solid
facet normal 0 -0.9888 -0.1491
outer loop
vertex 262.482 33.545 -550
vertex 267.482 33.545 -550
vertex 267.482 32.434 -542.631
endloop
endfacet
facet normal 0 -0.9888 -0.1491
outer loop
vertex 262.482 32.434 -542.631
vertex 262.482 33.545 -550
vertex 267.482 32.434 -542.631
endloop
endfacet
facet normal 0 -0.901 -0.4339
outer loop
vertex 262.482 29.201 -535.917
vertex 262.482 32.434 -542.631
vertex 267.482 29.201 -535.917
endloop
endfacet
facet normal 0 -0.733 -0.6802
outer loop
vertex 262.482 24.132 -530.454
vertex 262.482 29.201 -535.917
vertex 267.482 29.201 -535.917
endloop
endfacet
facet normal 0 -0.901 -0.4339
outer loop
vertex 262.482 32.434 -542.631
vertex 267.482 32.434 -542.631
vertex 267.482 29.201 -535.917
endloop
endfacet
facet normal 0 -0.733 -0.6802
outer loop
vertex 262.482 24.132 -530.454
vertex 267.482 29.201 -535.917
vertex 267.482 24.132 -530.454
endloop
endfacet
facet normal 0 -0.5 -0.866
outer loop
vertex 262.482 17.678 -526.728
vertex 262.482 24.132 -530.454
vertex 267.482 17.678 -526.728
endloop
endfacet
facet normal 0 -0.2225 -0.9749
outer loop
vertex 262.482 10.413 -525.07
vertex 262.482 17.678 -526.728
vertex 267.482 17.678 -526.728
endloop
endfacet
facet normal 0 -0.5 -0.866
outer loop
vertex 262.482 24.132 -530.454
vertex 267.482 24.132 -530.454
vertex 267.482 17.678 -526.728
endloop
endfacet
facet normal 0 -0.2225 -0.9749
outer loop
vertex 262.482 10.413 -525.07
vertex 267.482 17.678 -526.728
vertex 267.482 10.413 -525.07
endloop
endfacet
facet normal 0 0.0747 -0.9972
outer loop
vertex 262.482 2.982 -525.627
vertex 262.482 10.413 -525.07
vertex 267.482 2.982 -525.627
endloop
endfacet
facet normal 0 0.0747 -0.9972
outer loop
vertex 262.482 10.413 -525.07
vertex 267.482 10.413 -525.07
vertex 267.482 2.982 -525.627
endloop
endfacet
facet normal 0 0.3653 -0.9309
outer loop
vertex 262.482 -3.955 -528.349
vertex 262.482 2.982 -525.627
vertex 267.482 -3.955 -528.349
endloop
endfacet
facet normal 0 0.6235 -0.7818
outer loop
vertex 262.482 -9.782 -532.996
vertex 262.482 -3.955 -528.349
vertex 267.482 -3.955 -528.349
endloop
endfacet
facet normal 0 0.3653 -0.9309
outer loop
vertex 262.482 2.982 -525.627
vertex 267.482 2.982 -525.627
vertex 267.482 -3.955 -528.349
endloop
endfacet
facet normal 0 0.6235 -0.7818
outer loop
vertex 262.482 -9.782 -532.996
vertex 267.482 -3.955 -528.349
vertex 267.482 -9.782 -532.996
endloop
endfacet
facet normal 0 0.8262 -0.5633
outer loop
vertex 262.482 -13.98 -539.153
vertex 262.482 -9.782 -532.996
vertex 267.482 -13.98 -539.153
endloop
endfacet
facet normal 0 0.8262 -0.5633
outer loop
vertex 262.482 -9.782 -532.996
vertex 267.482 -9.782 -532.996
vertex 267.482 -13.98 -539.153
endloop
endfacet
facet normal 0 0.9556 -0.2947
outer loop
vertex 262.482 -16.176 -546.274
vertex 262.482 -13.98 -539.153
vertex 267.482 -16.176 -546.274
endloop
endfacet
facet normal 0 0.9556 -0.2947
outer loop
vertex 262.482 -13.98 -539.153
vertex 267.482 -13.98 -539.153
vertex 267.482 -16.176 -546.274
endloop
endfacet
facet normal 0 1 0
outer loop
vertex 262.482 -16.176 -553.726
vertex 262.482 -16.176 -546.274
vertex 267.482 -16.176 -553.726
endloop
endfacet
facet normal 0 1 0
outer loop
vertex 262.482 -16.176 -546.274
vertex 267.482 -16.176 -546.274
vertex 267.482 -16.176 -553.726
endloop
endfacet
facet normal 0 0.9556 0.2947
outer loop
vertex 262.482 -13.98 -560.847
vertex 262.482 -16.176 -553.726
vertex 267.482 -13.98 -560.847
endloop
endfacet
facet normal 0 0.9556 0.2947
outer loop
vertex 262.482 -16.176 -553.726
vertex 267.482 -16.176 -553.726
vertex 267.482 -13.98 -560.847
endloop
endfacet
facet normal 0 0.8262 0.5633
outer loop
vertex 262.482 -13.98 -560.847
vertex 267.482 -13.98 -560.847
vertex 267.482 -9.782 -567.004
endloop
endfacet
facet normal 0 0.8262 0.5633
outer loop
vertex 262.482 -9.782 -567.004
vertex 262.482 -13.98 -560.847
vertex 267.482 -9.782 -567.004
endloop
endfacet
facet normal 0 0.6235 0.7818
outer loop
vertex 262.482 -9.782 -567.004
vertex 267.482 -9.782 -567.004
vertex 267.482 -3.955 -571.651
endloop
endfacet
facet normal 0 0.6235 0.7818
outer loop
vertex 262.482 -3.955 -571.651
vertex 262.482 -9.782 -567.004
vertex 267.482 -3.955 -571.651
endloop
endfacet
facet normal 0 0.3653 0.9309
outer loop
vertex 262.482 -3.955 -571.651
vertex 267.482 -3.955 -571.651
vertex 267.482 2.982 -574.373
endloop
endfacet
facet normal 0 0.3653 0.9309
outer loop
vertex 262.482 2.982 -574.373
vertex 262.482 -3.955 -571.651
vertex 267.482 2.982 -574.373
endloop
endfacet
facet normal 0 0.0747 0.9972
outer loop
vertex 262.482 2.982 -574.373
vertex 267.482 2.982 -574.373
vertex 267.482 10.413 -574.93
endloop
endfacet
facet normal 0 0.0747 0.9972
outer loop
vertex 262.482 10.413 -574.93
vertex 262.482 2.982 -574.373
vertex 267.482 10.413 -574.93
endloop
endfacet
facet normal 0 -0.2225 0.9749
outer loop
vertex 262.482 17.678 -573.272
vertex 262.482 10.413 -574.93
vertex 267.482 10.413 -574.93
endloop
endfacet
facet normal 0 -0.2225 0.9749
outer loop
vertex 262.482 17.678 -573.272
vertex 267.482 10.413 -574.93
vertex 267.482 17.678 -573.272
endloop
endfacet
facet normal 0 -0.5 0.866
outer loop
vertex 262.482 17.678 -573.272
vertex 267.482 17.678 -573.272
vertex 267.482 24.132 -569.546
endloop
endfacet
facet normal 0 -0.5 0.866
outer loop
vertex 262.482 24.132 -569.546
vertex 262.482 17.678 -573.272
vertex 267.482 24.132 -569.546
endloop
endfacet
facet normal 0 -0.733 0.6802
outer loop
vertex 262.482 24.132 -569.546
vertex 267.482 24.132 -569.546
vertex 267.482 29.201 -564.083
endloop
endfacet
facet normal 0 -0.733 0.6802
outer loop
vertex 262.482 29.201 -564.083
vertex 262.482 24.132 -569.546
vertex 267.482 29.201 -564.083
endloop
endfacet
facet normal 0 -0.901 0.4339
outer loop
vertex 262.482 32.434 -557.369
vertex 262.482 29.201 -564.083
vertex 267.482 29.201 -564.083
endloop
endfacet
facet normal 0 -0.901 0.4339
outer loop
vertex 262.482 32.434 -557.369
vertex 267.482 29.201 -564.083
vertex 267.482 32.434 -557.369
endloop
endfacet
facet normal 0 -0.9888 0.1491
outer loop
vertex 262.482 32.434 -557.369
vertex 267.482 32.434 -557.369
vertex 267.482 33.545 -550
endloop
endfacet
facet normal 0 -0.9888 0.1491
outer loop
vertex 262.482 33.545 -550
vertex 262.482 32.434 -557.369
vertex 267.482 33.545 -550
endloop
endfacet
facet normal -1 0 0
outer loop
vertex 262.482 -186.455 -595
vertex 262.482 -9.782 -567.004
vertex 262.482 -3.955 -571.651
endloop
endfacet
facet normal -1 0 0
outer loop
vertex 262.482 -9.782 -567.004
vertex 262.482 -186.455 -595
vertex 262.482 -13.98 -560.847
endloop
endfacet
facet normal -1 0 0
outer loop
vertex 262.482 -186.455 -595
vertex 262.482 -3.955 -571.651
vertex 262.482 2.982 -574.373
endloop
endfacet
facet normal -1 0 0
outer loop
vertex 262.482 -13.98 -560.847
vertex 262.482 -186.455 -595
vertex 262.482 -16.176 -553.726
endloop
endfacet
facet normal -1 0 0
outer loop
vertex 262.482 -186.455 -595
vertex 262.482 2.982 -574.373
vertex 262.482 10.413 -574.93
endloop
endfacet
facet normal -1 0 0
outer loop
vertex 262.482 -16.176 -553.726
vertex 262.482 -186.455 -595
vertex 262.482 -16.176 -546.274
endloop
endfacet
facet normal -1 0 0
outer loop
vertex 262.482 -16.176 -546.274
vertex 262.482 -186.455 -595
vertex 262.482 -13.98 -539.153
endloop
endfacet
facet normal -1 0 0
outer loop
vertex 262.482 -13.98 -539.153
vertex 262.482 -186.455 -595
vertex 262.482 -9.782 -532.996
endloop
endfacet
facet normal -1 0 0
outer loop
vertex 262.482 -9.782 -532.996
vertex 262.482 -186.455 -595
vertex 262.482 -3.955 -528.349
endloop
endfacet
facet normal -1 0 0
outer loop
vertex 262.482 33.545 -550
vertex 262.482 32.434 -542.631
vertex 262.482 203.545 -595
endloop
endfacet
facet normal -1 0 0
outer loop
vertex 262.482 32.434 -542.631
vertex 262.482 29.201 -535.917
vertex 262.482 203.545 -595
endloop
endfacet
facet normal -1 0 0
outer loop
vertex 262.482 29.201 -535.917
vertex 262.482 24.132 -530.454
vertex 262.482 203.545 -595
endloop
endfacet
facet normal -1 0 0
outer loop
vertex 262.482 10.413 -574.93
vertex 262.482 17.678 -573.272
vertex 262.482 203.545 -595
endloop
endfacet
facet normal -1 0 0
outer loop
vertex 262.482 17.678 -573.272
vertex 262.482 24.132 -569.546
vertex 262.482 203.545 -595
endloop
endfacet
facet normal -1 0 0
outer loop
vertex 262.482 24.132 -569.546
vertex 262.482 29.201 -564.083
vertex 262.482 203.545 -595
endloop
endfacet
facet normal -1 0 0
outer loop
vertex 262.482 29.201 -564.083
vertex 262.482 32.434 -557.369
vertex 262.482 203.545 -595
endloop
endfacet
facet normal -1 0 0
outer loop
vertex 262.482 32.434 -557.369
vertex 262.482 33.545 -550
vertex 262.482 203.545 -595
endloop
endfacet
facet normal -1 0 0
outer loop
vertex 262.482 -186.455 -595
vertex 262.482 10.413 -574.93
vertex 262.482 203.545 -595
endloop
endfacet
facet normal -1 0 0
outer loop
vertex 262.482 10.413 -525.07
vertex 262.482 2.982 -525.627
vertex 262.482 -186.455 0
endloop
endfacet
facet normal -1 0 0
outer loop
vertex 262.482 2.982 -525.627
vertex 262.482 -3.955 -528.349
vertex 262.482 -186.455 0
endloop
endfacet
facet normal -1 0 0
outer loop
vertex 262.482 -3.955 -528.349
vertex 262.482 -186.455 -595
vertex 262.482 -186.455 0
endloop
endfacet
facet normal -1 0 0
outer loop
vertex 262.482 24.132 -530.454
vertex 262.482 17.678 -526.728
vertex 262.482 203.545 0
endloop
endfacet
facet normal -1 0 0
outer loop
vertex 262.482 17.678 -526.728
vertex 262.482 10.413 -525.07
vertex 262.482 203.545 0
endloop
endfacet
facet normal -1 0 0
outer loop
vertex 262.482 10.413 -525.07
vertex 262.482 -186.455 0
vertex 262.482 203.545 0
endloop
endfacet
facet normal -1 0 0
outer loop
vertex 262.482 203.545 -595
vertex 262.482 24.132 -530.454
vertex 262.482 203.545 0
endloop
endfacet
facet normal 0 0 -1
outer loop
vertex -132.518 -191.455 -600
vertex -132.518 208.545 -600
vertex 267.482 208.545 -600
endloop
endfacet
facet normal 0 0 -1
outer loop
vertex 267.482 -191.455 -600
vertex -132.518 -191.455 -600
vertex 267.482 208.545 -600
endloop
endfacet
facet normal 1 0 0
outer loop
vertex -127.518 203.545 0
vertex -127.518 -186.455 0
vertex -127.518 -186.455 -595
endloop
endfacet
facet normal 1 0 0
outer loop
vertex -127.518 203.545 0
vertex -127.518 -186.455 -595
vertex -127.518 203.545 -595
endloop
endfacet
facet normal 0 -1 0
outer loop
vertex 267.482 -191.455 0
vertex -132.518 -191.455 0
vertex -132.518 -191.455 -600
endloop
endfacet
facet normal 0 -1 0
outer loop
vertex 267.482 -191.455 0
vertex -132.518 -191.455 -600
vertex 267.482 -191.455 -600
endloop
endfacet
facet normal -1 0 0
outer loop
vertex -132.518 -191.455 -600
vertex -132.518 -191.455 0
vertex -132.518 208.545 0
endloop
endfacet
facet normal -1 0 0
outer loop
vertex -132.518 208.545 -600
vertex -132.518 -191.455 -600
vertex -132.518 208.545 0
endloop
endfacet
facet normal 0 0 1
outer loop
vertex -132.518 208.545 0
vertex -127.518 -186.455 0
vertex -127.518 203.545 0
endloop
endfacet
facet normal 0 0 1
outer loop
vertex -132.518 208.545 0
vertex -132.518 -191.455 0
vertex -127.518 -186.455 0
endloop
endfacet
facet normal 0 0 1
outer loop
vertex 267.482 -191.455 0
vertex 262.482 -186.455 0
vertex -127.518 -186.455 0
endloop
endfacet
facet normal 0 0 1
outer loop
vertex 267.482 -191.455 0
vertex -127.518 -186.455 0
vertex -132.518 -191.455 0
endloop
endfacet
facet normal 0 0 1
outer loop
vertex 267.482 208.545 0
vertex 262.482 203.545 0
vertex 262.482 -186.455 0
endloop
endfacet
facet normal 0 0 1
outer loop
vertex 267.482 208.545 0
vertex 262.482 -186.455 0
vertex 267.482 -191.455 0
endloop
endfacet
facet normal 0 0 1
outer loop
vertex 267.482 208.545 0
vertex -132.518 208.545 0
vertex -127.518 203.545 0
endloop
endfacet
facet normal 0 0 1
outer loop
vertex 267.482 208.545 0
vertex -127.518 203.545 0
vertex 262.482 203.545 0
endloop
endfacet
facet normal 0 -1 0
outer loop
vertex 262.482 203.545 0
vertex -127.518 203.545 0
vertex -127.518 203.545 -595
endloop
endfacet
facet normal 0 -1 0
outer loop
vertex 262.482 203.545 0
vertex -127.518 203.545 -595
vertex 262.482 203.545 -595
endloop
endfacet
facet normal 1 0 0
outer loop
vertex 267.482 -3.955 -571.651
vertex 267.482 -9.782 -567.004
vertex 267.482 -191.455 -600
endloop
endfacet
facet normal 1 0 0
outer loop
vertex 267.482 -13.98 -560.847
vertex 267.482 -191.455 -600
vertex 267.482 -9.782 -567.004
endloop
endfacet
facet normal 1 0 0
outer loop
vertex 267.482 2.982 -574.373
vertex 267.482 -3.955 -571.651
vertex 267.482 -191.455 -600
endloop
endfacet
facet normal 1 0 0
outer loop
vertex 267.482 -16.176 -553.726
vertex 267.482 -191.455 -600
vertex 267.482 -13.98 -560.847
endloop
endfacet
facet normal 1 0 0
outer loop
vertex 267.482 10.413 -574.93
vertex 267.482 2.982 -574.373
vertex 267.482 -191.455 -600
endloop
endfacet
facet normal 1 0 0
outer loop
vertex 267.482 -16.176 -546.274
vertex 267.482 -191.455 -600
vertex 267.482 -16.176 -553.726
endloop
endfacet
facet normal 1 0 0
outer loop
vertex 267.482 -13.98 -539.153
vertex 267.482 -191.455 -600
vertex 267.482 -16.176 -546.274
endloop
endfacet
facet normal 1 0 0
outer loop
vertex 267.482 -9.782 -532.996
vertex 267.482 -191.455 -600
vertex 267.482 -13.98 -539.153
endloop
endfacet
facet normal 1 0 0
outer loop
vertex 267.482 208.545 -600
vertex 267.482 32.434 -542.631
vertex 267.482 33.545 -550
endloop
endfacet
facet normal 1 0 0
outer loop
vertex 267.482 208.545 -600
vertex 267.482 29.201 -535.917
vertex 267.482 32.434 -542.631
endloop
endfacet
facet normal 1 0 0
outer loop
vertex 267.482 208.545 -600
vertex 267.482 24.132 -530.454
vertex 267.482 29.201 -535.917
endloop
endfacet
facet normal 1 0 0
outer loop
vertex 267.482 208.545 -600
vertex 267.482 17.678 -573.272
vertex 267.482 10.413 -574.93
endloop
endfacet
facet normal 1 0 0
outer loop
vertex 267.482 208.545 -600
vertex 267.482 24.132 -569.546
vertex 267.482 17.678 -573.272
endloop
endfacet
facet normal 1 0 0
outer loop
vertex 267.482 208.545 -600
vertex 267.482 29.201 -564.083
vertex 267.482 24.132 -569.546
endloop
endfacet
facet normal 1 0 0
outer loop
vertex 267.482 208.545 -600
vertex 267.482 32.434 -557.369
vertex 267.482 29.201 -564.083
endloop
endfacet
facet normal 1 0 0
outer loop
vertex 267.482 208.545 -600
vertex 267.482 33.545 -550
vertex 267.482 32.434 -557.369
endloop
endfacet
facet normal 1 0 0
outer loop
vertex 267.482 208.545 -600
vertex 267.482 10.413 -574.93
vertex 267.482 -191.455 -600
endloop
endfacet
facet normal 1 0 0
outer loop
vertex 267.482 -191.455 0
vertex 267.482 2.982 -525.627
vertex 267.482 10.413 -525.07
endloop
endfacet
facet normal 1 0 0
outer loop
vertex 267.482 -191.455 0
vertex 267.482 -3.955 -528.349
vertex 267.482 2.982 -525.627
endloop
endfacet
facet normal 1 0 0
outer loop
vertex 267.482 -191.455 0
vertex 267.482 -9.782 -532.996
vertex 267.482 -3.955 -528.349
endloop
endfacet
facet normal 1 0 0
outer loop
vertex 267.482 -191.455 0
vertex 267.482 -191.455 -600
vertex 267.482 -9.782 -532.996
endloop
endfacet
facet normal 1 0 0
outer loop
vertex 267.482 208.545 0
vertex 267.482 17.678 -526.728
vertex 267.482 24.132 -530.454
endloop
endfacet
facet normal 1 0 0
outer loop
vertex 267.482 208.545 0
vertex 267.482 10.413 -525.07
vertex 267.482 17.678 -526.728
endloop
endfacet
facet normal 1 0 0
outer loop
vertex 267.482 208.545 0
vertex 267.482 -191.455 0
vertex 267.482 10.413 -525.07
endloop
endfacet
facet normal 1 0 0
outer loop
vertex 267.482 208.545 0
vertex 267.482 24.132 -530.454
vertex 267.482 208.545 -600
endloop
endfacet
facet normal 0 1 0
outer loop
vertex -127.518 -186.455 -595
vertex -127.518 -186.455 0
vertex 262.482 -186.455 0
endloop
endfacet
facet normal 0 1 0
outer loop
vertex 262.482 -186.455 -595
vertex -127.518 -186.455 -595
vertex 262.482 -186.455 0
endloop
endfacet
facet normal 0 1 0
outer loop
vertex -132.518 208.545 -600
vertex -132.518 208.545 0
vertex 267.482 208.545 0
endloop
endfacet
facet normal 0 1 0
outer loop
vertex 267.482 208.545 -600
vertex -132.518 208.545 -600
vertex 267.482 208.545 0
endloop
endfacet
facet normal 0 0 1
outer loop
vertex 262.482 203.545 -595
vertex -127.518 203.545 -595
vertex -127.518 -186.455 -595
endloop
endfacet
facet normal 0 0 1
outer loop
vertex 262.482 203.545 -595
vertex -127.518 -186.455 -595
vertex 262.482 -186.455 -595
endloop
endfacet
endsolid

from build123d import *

# Parameters (mm, degrees)
F0_W     = 400
F0_H     = 400
F1_DEPTH = 600
F2_T     = -5
F3_R     = 25
F4_DEPTH = 30


with BuildPart() as f1:
    # F0 (on Top) → F1 (new body)
    with BuildSketch(Plane.XY):
        with Locations((67.481734, 8.544586)):
            Rectangle(F0_W, F0_H)
    extrude(amount=-F1_DEPTH)

    # F2
    f2_openings = [f1.faces().sort_by_distance(p)[0] for p in [
        (67.481734, 8.544586, 0),
    ]]
    offset(amount=F2_T, openings=f2_openings)

    # F3 (on face) → F4 (cut)
    with BuildSketch(Plane.YZ.offset(267.481734)):
        with Locations((8.544586, -550)):
            Circle(F3_R)
    extrude(amount=-F4_DEPTH, mode=Mode.SUBTRACT)


solid = f1.part
